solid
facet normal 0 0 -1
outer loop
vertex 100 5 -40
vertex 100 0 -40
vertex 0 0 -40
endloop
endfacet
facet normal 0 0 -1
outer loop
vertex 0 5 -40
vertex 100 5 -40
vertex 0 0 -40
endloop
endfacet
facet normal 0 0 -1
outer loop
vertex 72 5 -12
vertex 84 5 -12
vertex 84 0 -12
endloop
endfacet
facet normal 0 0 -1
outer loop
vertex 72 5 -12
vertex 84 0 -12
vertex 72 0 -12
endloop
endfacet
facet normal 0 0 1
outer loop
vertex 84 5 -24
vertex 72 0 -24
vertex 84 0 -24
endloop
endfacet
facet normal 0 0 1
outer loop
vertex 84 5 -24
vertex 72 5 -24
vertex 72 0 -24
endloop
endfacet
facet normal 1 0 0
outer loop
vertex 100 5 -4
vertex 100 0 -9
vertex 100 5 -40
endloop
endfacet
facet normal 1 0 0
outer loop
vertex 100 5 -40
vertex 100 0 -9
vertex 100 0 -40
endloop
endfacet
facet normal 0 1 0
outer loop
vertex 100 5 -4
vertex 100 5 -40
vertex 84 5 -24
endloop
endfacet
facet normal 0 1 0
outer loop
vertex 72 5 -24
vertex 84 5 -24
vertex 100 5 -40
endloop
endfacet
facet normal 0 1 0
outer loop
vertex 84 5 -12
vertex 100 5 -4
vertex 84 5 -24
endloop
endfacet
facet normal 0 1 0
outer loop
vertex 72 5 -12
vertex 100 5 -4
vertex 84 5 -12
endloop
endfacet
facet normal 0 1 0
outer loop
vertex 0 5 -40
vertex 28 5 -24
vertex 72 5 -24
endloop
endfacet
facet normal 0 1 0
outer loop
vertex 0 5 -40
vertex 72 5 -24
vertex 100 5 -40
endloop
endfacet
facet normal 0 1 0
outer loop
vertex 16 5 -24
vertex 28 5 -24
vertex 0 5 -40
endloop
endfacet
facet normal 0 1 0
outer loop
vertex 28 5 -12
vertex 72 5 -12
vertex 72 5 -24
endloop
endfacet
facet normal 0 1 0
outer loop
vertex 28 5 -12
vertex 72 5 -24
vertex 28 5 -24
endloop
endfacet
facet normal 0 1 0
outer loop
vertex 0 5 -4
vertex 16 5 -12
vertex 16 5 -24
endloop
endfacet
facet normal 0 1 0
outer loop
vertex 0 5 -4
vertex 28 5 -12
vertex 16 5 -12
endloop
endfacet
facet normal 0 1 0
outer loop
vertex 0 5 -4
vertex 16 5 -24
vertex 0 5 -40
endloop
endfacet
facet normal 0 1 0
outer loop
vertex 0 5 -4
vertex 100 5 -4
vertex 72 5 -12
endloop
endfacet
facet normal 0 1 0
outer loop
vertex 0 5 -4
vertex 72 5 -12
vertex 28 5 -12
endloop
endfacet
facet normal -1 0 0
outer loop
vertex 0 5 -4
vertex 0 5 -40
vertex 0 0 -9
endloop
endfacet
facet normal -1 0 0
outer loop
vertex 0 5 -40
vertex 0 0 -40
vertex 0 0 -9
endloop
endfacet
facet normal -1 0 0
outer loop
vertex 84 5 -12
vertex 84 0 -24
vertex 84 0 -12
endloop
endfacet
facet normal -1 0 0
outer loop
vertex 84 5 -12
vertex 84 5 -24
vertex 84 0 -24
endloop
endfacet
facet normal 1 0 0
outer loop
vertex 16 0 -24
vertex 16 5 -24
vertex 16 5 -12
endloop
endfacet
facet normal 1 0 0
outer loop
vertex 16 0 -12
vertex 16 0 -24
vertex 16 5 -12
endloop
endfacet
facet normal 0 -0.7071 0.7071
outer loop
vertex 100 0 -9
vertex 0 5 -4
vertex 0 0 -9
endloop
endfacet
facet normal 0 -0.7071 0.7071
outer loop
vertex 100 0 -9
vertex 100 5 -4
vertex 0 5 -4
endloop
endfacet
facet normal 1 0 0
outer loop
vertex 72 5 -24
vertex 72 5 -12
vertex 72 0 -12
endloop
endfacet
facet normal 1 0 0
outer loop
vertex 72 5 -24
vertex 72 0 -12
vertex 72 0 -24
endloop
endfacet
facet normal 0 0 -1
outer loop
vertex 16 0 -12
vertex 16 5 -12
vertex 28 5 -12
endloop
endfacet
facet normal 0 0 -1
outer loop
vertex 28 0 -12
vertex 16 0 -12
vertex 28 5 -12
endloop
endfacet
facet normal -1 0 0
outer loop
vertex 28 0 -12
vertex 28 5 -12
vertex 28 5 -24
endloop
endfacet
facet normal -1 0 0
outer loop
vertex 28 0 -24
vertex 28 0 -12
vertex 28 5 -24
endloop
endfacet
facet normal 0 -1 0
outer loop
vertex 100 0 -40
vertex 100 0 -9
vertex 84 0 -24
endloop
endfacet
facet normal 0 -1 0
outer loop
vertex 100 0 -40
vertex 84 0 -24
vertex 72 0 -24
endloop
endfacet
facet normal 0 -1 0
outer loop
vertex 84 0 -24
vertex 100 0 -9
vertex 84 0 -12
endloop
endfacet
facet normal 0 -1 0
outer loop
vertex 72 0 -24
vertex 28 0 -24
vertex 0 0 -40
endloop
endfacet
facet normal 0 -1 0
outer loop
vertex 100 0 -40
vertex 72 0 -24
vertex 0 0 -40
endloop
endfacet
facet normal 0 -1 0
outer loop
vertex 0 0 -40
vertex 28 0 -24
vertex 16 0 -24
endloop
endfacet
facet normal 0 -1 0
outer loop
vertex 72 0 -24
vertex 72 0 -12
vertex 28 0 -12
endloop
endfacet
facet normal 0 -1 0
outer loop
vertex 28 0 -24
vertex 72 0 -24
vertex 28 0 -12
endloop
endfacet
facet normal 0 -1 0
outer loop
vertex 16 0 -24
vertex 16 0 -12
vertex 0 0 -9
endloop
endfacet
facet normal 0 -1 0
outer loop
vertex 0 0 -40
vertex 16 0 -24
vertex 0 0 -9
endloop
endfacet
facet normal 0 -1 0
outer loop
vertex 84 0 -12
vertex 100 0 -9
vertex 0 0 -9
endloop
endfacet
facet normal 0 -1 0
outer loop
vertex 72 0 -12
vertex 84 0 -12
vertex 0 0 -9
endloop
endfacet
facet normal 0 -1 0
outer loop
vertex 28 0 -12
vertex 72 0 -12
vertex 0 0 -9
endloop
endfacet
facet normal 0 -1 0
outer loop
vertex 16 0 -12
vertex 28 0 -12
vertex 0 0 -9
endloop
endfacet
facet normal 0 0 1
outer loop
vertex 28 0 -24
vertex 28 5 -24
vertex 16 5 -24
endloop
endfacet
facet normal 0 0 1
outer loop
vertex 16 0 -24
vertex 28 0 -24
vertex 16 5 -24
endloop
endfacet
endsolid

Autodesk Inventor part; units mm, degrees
ref_plane "YZ Plane" through (0, 0, 0) normal (1, 0, 0) x (0, 1, 0)
ref_plane "XZ Plane" through (0, 0, 0) normal (0, 1, 0) x (-1, 0, 0)
ref_plane "XY Plane" through (0, 0, 0) normal (0, 0, 1) x (1, 0, 0)
sketch "Szkic1" plane through (0, 0, 0) normal (0, 1, 0) x (-1, 0, 0)
  line L0 (0, 0) -> (-100, 0)
  line L1 (-100, 0) -> (-100, -40)
  line L2 (-100, -40) -> (0, -40)
  line L3 (0, -40) -> (0, 0)
  dimension "d0" = 100
  dimension "d1" = 40
extrude "Wyciągnięcie proste1" add sketch "Szkic1" along normal blind 5
sketch "Szkic4" plane through (100, 0, 0) normal (1, 0, 0) x (0, 0, -1)
  line L0 (0, 5) -> (40, 5) projected
  line L1 (0, 5) -> (4.346, 0)
  line L2 (0, 0) -> (40, 0) projected
  line L3 (0, 0) -> (0, 5) projected
  line L4 (0, 0) -> (0, 5)
  line L5 (0, 5) -> (4.346, 0)
extrude "Wyciągnięcie proste2" cut sketch "Szkic4" against normal blind 100
sketch "Szkic5" plane through (100, 0, -40) normal (1, 0, 0) x (0, 0, -1)
  line L0 (-40, 5) -> (0, 5) projected
  line L1 (-40, 5) -> (-35, 0)
  line L2 (-35.654, 0) -> (0, 0) projected
  line L3 (-40, 5) -> (-32.9289, 5) construction
  line L4 (-35, 0) -> (-40, 0)
  line L5 (-35.654, 0) -> (-40, 5) projected
  line L6 (-40, 0) -> (-40, 5)
  dimension "d6" = 45
extrude "Wyciągnięcie proste3" cut sketch "Szkic5" against normal blind 100.25
sketch "Szkic6" plane through (100, 0, -40) normal (1, 0, 0) x (0, 0, -1)
  line L0 (0, 5) -> (-40, 5) projected
  line L1 (-40, 5) -> (-38, 5)
  line L2 (-38, 5) -> (-33, 0)
  line L3 (0, 0) -> (-35, 0) projected
  line L4 (-33, 0) -> (-35, 0)
  line L5 (-35, 0) -> (-40, 5)
  point P0 (-40, 0)
  dimension "d9" = 2
  dimension "d10" = 135
extrude "Wyciągnięcie proste4" cut sketch "Szkic6" against normal blind 100.25
sketch "Szkic7" plane through (100, 0, -40) normal (1, 0, 0) x (0, 0, -1)
  line L0 (-33, 0) -> (-38, 5) projected
  line L1 (-38, 5) -> (-36, 5)
  line L2 (0, 5) -> (-38, 5) projected
  line L3 (-36, 5) -> (-31, 0)
  line L4 (0, 0) -> (-33, 0) projected
  line L5 (-31, 0) -> (-33, 0)
  line L6 (-33, 0) -> (-38, 5)
  point P0 (-40, 0)
  dimension "d13" = 2
  dimension "d14" = 135
extrude "Wyciągnięcie proste5" cut sketch "Szkic7" against normal blind 100
sketch "Szkic13" plane through (0, 5, 0) normal (0, 1, 0) x (1, 0, 0)
  line L0 (16, 12) -> (28, 12)
  line L1 (28, 12) -> (28, 24)
  line L2 (28, 24) -> (16, 24)
  line L3 (16, 24) -> (16, 12)
  point P0 (0, 0)
  dimension "d17" = 12
  dimension "d18" = 12
extrude "Wyciągnięcie proste6" cut sketch "Szkic13" against normal blind 10
sketch "Szkic14" plane through (0, 5, 0) normal (0, 1, 0) x (1, 0, 0)
  line L0 (84, 12) -> (72, 12)
  line L1 (72, 12) -> (72, 24)
  line L2 (72, 24) -> (84, 24)
  line L3 (84, 24) -> (84, 12)
  point P0 (0, 0)
  dimension "d21" = 12
  dimension "d22" = 12
extrude "Wyciągnięcie proste7" cut sketch "Szkic14" against normal blind 10
properties part number "Helenowiak_plug"
